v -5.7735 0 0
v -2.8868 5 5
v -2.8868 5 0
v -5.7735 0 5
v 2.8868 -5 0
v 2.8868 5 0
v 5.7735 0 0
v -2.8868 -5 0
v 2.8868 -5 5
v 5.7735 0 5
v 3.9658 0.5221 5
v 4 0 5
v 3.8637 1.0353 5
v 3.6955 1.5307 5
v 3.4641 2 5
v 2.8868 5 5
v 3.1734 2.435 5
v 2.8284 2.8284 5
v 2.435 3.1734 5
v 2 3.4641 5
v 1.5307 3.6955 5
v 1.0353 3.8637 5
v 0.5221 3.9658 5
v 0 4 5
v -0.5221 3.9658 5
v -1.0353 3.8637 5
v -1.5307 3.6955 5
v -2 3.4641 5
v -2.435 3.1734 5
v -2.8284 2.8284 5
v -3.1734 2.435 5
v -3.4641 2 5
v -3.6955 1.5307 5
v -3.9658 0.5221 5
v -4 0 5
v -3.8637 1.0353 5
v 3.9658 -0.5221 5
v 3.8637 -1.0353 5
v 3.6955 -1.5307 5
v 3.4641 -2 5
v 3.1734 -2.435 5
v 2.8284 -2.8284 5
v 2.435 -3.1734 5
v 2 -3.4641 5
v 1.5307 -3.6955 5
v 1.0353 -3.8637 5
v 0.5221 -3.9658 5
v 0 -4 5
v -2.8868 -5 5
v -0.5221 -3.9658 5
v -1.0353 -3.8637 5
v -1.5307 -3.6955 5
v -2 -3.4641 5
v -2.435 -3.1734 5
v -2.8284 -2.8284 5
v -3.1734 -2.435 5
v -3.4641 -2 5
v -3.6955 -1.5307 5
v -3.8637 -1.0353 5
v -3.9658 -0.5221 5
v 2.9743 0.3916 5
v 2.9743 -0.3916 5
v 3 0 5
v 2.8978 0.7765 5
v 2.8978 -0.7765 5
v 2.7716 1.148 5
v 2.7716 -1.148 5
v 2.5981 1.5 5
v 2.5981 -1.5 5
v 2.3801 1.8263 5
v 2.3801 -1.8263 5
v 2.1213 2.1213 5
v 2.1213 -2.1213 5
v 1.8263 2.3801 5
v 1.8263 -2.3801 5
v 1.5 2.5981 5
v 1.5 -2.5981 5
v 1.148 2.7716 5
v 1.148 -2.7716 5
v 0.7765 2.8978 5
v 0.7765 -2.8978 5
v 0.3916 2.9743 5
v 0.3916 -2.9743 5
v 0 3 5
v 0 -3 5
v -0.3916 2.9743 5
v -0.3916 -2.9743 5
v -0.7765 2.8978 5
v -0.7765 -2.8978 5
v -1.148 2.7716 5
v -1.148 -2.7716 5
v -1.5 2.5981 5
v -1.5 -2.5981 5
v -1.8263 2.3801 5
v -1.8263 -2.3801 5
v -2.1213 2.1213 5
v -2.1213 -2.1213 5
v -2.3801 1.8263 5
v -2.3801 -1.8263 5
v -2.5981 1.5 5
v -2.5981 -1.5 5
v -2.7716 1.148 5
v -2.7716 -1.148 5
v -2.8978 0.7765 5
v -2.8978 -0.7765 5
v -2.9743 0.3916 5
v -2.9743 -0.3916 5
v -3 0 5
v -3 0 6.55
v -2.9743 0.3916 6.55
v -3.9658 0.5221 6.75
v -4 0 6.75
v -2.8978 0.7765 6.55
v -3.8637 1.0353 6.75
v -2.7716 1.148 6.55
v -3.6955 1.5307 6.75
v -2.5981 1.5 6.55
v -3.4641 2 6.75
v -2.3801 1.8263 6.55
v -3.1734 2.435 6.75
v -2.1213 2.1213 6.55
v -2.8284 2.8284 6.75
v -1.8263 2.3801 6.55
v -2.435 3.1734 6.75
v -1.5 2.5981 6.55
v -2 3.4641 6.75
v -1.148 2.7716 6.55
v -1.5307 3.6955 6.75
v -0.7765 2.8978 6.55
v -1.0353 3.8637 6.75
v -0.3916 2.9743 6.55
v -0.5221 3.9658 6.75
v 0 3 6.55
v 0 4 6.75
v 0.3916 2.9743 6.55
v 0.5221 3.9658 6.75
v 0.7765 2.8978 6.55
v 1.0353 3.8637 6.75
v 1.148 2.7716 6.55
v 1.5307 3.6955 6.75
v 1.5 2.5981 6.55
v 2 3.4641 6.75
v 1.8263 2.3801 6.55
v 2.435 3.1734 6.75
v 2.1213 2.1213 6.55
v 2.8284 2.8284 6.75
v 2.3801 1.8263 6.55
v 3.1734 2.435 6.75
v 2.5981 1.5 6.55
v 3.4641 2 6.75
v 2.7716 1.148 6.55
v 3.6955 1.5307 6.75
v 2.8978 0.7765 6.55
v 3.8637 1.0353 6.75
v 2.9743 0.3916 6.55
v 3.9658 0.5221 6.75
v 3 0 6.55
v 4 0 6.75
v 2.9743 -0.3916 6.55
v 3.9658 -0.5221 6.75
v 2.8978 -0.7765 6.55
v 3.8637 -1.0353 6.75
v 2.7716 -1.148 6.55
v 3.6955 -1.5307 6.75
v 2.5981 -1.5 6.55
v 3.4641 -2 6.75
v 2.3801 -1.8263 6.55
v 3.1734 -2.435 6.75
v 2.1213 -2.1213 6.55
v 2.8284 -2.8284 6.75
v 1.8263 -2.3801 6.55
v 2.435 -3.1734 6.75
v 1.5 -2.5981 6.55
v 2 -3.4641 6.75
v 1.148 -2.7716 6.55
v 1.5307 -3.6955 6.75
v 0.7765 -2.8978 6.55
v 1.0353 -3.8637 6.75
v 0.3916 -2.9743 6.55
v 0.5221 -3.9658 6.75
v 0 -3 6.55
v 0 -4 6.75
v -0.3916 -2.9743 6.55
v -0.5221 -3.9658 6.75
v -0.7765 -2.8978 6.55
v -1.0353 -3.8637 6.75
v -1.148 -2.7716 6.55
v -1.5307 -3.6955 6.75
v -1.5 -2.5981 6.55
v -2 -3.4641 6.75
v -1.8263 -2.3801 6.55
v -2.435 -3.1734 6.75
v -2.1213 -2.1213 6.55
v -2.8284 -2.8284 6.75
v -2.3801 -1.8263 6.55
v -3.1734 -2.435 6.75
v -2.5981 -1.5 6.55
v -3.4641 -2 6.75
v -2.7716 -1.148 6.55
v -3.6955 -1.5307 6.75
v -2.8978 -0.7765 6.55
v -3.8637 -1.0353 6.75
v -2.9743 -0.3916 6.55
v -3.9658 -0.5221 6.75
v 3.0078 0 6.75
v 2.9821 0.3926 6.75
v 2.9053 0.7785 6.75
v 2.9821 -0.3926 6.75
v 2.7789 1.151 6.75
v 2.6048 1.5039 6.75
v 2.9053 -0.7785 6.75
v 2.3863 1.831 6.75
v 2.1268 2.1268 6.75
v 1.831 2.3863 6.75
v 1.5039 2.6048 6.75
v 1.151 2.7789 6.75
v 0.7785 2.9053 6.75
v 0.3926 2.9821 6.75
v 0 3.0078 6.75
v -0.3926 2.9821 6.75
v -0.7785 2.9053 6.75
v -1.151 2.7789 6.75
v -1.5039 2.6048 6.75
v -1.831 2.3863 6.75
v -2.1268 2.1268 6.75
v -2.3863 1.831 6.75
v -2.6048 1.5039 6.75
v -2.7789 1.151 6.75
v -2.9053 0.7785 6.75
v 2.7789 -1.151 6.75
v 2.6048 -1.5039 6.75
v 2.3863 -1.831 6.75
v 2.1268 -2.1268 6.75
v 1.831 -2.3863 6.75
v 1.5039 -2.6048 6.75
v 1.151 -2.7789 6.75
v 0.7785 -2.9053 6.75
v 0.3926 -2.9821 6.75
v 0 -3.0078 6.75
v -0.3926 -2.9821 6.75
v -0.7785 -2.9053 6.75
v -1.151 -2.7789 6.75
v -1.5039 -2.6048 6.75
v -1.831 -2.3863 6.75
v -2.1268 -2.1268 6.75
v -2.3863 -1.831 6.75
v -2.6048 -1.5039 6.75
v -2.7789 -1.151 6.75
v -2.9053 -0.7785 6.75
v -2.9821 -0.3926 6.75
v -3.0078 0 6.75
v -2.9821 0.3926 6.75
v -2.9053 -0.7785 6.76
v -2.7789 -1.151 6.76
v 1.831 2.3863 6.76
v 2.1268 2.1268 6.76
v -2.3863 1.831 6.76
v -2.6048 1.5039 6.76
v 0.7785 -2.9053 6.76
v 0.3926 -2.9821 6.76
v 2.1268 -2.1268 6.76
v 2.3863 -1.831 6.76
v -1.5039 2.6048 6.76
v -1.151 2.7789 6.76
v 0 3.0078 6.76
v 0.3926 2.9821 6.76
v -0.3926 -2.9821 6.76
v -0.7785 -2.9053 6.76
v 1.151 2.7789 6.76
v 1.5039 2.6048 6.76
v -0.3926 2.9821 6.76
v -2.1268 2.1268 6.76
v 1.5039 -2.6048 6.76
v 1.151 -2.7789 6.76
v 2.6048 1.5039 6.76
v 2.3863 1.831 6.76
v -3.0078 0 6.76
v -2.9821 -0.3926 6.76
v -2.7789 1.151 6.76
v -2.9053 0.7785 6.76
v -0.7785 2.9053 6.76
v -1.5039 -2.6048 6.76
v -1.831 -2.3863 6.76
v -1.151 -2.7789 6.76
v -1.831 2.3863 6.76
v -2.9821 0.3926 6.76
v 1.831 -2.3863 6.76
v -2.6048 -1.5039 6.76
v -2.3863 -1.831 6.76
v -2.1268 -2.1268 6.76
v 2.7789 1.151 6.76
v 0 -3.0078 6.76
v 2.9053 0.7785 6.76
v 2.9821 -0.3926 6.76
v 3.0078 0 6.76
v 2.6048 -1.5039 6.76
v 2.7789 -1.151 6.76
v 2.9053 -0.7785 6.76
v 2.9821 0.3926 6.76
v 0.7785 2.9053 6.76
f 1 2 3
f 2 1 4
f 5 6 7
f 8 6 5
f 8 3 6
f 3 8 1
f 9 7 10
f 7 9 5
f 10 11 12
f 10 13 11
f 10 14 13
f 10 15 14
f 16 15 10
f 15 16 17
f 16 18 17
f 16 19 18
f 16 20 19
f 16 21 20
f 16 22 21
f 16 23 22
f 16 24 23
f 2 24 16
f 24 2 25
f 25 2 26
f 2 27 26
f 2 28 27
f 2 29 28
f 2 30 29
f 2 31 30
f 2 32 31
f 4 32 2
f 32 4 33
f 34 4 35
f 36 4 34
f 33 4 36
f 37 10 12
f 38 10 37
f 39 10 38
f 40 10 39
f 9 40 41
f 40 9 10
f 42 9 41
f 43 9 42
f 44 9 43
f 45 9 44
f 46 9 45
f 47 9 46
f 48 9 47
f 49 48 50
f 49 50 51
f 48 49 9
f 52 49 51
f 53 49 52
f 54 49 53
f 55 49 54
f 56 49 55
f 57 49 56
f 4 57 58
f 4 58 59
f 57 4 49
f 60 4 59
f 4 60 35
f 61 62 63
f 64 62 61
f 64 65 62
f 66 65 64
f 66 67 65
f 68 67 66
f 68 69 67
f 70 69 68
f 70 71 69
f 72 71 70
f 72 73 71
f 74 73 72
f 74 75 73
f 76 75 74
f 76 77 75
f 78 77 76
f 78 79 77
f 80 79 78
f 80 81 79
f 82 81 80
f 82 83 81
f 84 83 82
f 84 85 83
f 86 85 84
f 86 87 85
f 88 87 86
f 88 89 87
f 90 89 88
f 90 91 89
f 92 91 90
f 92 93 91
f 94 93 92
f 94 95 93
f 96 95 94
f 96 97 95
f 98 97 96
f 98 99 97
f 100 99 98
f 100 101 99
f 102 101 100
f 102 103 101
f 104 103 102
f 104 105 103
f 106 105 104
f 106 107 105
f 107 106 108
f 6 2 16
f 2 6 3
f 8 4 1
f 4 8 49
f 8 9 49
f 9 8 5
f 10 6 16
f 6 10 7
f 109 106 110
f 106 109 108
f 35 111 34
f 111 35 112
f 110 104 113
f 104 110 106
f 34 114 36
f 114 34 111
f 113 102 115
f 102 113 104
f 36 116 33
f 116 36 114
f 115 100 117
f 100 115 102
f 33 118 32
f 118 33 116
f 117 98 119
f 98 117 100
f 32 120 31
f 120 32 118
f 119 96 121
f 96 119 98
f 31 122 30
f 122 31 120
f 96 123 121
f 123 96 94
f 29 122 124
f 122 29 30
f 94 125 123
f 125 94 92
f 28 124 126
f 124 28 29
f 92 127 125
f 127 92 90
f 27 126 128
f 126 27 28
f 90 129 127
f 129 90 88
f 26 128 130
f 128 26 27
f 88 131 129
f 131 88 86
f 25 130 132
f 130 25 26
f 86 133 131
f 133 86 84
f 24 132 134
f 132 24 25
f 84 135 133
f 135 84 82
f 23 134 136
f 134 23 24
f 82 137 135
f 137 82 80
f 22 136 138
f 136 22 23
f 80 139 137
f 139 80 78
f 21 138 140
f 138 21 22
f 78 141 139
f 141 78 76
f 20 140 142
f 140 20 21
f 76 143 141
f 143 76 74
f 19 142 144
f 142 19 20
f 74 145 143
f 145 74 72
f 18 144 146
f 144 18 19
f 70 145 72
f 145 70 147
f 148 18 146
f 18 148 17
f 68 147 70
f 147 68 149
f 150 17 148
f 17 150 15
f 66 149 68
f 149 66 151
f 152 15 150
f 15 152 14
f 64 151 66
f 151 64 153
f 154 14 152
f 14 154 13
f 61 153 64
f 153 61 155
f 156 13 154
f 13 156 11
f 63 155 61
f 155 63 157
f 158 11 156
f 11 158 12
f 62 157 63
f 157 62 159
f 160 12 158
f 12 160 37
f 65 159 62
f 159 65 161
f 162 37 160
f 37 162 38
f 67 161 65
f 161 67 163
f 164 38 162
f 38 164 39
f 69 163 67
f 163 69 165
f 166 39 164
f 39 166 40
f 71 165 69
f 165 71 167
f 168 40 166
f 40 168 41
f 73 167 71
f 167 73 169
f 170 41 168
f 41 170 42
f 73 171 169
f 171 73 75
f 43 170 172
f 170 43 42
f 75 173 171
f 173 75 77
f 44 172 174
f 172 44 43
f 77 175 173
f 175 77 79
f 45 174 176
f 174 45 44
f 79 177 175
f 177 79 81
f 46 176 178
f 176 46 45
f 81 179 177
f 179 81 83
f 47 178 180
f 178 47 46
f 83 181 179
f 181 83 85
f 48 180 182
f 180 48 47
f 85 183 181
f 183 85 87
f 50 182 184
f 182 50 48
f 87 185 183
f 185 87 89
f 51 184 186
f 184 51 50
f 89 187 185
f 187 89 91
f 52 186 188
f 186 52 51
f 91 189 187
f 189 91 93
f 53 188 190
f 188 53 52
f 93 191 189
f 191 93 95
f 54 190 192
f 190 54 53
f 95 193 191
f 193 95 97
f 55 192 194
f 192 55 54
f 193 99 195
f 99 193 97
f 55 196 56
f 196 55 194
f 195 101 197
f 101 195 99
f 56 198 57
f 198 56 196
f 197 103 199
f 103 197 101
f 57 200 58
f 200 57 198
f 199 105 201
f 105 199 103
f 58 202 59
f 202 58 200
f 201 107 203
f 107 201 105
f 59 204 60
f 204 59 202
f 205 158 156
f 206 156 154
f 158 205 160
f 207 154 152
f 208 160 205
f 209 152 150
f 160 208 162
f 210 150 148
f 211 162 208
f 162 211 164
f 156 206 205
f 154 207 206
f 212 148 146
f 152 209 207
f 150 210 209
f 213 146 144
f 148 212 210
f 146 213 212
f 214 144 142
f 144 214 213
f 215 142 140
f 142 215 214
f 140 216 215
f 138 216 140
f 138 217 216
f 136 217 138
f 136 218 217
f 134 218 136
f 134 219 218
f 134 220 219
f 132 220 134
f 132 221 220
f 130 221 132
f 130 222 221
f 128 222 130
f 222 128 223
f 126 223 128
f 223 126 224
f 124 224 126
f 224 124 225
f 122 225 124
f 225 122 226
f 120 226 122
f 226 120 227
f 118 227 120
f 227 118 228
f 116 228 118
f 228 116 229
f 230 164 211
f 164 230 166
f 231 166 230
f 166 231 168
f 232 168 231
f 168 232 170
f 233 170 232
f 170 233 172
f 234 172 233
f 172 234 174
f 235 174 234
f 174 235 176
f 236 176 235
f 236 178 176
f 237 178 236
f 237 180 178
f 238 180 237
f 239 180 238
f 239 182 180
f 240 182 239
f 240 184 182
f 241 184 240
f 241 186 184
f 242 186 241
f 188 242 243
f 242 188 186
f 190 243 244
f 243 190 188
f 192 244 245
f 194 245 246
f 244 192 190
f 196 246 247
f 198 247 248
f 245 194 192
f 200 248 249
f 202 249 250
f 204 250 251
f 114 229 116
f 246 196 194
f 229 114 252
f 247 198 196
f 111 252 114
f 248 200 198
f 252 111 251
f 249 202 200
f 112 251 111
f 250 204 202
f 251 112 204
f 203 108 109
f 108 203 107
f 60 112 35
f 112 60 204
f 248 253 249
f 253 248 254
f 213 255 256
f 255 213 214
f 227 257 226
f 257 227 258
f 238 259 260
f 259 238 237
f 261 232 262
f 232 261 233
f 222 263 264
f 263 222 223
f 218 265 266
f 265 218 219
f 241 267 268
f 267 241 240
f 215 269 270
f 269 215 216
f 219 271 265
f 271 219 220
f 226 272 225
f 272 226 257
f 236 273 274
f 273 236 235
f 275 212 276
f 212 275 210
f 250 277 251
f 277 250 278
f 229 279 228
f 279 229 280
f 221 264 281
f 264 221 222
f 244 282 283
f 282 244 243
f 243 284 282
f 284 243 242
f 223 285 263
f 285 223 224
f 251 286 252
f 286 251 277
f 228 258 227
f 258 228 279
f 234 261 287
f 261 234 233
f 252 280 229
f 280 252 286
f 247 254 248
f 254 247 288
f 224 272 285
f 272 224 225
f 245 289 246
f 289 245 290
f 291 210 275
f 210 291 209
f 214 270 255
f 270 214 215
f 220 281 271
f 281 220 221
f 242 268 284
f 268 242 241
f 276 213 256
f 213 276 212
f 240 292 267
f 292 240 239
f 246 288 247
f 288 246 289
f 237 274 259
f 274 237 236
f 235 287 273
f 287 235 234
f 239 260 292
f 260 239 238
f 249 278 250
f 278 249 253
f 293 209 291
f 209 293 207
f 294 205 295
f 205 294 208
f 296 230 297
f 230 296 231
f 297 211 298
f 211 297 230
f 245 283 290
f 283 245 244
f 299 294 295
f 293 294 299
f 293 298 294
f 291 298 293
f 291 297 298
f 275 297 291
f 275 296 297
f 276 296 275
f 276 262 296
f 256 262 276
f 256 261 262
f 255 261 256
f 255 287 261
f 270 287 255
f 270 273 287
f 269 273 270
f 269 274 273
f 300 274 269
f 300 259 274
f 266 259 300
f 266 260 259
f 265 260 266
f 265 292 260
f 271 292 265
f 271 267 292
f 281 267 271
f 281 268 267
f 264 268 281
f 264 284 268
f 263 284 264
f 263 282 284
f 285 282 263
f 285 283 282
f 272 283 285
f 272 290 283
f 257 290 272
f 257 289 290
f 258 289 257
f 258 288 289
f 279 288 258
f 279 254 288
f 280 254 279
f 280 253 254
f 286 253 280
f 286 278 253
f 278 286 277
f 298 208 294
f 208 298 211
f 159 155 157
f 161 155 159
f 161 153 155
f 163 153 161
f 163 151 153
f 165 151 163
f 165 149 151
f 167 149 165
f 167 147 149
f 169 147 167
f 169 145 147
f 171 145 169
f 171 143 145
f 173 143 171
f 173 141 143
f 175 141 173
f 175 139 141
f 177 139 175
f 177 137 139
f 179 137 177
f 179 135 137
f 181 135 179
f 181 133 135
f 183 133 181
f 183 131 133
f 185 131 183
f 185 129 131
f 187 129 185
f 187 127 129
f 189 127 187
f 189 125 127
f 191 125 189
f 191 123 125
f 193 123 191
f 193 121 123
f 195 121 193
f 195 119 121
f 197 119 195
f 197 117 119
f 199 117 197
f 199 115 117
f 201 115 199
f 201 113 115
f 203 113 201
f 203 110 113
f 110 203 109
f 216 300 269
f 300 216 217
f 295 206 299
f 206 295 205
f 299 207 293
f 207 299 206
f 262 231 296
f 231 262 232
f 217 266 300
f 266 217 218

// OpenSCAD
// file: ../config.scad
// SCARA 로봇 공통 사양(specification) — 모든 부품 파일에서 include해 사용한다.

$fn = 48;

// ── 공차(tolerance) ──
print_clearance = 0.2;   // FDM 출력 끼워맞춤(fit) 여유 — 압입(press-fit) 자리 제외
eps             = 1/128; // 미세 겹침(epsilon) — 접하는 솔리드를 살짝 겹쳐 동일면(coincident face) z-파이팅 방지

// ── FDM 출력 사양(print specification) ──
fdm_layer_h       = 0.28;   // 레이어 높이(layer height) — 슬라이서(slicer) 설정값과 일치시킨다.
fdm_shoulder_layers = 6;   // 숄더(shoulder) 최소 레이어 수 — FDM 최소 구조 벽(0.4mm 노즐 3겹 ~1.2mm) 기준 하한값.

// ── 레이아웃(layout) ──
// layout_margin — 플레이트 위 부품 배치 공통 여백(margin). 부품 외곽선에서
// 사방으로 주는 값 → 부품끼리는 2*margin 이격, 외곽 가장자리도 margin 확보.
layout_margin = 4;

// ── 시트 형상(seat geometry) ──
// seat_shoulder_t — fdm_layer_h · fdm_shoulder_layers 파생. 슬라이서 설정 변경 시 자동 연동.
seat_shoulder_t = fdm_layer_h * fdm_shoulder_layers;
// main file
/*
 * lock_nuts.scad - 나일록 락너트(nyloc lock nut) 기성품(vitamin)
 *
 * SCARA 회전 관절축(revolute axis)에서 숄더 볼트(shoulder bolt)를 풀림
 * 방지(self-locking)로 고정하는 M6 나일록 락너트 시각화용 모델. 제네릭
 * lock_nut()은 육각(hex) 맞변거리·높이·나사 지름을 인자로 받아 어떤
 * 규격이든 만든다. M6 변형은 그 규격의 리터럴을 채운다.
 *
 * Z 브레이크포인트(Z breakpoint) 최적화: 육각 금속부(non-round)는 정육각
 * 단면 한 개를 linear_extrude로 한 번에 쌓는다. 그 위 나일론 칼라(nylon
 * collar)는 회전 대칭(rotationally symmetric)이라 사각 단면 한 개의
 * 단일 rotate_extrude 링으로 만든다. 보어(bore)는 difference로 깎지 않고
 * 어두운 마커로 표현한다 — 음각은 미리보기(F5)에서 안 보이기 때문이다.
 *
 * 좌표계: 축(axis) = Z, 너트 아랫면(bottom face) = z=0. 육각부는
 * z=0..height, 나일론 칼라는 그 위에 얹힌다.
 */

include <../config.scad>

/* --- 색상(cosmetic) --- */
c_steel		= [0.52, 0.53, 0.56];	/* 아연도금강(zinc-plated steel) */
c_nylon		= [0.92, 0.92, 0.88];	/* 나일론 칼라(nylon collar) */
c_bore		= [0.12, 0.12, 0.13];	/* 보어(bore) 음각 마커 */

/*
 * 락너트(제네릭) — 육각 맞변거리(across-flats)·높이·나사 지름을 인자로
 * 받아 육각 금속부 + 나일론 칼라로 만든다. 빌드 헬퍼는 중첩 모듈로 두고
 * difference·union 없이 솔리드를 그대로 배치한다.
 *   af        육각 맞변거리(across-flats) — 렌치 물림면 거리
 *   height    육각 금속부(hex metal body) 높이
 *   thread_d  나사 지름(thread diameter) — 보어 마커 지름
 */
module lock_nut(af, height, thread_d)
{
	/* 외형 비율(cosmetic) — 규격과 무관 */
	collar_h	= height * 0.35;	/* 나일론 칼라(collar) 높이 */
	collar_t	= af * 0.10;		/* 칼라 링(ring) 반경 두께 */
	bore_t		= 0.2;			/* 보어 마커 음각 표시 두께 */

	/* 파생(derived) */
	hex_r	= af / sqrt(3);		/* 외접원(circumscribed) 반지름 */
	br	= thread_d / 2;		/* 보어 반지름 */
	cr	= br + collar_t;	/* 나일론 칼라 외반경 */

	/* Z 브레이크포인트 사각 링 — 반경 r0..r1, 높이 z0..z1 단일 회전체 */
	module ring(r0, r1, z0, z1)
		rotate_extrude(convexity = 2)
			polygon([[r0, z0], [r1, z0], [r1, z1], [r0, z1]]);

	/* 육각 금속부(hex metal body) — 렌치 물림면(wrench flat) */
	color(c_steel)
		linear_extrude(height)
			circle(r = hex_r, $fn = 6);

	/*
	 * 나일론 칼라(nylon collar) — 나사산을 파고드는 자체 풀림 방지
	 * (self-locking) 링. 보어 둘레만 얇게 얹는다.
	 */
	color(c_nylon)
		ring(br, cr, height - eps, height + collar_h);

	/* 보어(bore) — difference 음각 대신 어두운 마커 */
	color(c_bore)
		ring(0, br + eps, height + collar_h - bore_t,
		     height + collar_h + 0.01);
}

/* --- 표준 변형(convenience) --- */
module m4_lock_nut() { lock_nut(7, 3.2, 4); }	/* 스탠드오프 체결 */
module m6_lock_nut() { lock_nut(10, 5, 6); }	/* 회전 관절축 */

m6_lock_nut();
